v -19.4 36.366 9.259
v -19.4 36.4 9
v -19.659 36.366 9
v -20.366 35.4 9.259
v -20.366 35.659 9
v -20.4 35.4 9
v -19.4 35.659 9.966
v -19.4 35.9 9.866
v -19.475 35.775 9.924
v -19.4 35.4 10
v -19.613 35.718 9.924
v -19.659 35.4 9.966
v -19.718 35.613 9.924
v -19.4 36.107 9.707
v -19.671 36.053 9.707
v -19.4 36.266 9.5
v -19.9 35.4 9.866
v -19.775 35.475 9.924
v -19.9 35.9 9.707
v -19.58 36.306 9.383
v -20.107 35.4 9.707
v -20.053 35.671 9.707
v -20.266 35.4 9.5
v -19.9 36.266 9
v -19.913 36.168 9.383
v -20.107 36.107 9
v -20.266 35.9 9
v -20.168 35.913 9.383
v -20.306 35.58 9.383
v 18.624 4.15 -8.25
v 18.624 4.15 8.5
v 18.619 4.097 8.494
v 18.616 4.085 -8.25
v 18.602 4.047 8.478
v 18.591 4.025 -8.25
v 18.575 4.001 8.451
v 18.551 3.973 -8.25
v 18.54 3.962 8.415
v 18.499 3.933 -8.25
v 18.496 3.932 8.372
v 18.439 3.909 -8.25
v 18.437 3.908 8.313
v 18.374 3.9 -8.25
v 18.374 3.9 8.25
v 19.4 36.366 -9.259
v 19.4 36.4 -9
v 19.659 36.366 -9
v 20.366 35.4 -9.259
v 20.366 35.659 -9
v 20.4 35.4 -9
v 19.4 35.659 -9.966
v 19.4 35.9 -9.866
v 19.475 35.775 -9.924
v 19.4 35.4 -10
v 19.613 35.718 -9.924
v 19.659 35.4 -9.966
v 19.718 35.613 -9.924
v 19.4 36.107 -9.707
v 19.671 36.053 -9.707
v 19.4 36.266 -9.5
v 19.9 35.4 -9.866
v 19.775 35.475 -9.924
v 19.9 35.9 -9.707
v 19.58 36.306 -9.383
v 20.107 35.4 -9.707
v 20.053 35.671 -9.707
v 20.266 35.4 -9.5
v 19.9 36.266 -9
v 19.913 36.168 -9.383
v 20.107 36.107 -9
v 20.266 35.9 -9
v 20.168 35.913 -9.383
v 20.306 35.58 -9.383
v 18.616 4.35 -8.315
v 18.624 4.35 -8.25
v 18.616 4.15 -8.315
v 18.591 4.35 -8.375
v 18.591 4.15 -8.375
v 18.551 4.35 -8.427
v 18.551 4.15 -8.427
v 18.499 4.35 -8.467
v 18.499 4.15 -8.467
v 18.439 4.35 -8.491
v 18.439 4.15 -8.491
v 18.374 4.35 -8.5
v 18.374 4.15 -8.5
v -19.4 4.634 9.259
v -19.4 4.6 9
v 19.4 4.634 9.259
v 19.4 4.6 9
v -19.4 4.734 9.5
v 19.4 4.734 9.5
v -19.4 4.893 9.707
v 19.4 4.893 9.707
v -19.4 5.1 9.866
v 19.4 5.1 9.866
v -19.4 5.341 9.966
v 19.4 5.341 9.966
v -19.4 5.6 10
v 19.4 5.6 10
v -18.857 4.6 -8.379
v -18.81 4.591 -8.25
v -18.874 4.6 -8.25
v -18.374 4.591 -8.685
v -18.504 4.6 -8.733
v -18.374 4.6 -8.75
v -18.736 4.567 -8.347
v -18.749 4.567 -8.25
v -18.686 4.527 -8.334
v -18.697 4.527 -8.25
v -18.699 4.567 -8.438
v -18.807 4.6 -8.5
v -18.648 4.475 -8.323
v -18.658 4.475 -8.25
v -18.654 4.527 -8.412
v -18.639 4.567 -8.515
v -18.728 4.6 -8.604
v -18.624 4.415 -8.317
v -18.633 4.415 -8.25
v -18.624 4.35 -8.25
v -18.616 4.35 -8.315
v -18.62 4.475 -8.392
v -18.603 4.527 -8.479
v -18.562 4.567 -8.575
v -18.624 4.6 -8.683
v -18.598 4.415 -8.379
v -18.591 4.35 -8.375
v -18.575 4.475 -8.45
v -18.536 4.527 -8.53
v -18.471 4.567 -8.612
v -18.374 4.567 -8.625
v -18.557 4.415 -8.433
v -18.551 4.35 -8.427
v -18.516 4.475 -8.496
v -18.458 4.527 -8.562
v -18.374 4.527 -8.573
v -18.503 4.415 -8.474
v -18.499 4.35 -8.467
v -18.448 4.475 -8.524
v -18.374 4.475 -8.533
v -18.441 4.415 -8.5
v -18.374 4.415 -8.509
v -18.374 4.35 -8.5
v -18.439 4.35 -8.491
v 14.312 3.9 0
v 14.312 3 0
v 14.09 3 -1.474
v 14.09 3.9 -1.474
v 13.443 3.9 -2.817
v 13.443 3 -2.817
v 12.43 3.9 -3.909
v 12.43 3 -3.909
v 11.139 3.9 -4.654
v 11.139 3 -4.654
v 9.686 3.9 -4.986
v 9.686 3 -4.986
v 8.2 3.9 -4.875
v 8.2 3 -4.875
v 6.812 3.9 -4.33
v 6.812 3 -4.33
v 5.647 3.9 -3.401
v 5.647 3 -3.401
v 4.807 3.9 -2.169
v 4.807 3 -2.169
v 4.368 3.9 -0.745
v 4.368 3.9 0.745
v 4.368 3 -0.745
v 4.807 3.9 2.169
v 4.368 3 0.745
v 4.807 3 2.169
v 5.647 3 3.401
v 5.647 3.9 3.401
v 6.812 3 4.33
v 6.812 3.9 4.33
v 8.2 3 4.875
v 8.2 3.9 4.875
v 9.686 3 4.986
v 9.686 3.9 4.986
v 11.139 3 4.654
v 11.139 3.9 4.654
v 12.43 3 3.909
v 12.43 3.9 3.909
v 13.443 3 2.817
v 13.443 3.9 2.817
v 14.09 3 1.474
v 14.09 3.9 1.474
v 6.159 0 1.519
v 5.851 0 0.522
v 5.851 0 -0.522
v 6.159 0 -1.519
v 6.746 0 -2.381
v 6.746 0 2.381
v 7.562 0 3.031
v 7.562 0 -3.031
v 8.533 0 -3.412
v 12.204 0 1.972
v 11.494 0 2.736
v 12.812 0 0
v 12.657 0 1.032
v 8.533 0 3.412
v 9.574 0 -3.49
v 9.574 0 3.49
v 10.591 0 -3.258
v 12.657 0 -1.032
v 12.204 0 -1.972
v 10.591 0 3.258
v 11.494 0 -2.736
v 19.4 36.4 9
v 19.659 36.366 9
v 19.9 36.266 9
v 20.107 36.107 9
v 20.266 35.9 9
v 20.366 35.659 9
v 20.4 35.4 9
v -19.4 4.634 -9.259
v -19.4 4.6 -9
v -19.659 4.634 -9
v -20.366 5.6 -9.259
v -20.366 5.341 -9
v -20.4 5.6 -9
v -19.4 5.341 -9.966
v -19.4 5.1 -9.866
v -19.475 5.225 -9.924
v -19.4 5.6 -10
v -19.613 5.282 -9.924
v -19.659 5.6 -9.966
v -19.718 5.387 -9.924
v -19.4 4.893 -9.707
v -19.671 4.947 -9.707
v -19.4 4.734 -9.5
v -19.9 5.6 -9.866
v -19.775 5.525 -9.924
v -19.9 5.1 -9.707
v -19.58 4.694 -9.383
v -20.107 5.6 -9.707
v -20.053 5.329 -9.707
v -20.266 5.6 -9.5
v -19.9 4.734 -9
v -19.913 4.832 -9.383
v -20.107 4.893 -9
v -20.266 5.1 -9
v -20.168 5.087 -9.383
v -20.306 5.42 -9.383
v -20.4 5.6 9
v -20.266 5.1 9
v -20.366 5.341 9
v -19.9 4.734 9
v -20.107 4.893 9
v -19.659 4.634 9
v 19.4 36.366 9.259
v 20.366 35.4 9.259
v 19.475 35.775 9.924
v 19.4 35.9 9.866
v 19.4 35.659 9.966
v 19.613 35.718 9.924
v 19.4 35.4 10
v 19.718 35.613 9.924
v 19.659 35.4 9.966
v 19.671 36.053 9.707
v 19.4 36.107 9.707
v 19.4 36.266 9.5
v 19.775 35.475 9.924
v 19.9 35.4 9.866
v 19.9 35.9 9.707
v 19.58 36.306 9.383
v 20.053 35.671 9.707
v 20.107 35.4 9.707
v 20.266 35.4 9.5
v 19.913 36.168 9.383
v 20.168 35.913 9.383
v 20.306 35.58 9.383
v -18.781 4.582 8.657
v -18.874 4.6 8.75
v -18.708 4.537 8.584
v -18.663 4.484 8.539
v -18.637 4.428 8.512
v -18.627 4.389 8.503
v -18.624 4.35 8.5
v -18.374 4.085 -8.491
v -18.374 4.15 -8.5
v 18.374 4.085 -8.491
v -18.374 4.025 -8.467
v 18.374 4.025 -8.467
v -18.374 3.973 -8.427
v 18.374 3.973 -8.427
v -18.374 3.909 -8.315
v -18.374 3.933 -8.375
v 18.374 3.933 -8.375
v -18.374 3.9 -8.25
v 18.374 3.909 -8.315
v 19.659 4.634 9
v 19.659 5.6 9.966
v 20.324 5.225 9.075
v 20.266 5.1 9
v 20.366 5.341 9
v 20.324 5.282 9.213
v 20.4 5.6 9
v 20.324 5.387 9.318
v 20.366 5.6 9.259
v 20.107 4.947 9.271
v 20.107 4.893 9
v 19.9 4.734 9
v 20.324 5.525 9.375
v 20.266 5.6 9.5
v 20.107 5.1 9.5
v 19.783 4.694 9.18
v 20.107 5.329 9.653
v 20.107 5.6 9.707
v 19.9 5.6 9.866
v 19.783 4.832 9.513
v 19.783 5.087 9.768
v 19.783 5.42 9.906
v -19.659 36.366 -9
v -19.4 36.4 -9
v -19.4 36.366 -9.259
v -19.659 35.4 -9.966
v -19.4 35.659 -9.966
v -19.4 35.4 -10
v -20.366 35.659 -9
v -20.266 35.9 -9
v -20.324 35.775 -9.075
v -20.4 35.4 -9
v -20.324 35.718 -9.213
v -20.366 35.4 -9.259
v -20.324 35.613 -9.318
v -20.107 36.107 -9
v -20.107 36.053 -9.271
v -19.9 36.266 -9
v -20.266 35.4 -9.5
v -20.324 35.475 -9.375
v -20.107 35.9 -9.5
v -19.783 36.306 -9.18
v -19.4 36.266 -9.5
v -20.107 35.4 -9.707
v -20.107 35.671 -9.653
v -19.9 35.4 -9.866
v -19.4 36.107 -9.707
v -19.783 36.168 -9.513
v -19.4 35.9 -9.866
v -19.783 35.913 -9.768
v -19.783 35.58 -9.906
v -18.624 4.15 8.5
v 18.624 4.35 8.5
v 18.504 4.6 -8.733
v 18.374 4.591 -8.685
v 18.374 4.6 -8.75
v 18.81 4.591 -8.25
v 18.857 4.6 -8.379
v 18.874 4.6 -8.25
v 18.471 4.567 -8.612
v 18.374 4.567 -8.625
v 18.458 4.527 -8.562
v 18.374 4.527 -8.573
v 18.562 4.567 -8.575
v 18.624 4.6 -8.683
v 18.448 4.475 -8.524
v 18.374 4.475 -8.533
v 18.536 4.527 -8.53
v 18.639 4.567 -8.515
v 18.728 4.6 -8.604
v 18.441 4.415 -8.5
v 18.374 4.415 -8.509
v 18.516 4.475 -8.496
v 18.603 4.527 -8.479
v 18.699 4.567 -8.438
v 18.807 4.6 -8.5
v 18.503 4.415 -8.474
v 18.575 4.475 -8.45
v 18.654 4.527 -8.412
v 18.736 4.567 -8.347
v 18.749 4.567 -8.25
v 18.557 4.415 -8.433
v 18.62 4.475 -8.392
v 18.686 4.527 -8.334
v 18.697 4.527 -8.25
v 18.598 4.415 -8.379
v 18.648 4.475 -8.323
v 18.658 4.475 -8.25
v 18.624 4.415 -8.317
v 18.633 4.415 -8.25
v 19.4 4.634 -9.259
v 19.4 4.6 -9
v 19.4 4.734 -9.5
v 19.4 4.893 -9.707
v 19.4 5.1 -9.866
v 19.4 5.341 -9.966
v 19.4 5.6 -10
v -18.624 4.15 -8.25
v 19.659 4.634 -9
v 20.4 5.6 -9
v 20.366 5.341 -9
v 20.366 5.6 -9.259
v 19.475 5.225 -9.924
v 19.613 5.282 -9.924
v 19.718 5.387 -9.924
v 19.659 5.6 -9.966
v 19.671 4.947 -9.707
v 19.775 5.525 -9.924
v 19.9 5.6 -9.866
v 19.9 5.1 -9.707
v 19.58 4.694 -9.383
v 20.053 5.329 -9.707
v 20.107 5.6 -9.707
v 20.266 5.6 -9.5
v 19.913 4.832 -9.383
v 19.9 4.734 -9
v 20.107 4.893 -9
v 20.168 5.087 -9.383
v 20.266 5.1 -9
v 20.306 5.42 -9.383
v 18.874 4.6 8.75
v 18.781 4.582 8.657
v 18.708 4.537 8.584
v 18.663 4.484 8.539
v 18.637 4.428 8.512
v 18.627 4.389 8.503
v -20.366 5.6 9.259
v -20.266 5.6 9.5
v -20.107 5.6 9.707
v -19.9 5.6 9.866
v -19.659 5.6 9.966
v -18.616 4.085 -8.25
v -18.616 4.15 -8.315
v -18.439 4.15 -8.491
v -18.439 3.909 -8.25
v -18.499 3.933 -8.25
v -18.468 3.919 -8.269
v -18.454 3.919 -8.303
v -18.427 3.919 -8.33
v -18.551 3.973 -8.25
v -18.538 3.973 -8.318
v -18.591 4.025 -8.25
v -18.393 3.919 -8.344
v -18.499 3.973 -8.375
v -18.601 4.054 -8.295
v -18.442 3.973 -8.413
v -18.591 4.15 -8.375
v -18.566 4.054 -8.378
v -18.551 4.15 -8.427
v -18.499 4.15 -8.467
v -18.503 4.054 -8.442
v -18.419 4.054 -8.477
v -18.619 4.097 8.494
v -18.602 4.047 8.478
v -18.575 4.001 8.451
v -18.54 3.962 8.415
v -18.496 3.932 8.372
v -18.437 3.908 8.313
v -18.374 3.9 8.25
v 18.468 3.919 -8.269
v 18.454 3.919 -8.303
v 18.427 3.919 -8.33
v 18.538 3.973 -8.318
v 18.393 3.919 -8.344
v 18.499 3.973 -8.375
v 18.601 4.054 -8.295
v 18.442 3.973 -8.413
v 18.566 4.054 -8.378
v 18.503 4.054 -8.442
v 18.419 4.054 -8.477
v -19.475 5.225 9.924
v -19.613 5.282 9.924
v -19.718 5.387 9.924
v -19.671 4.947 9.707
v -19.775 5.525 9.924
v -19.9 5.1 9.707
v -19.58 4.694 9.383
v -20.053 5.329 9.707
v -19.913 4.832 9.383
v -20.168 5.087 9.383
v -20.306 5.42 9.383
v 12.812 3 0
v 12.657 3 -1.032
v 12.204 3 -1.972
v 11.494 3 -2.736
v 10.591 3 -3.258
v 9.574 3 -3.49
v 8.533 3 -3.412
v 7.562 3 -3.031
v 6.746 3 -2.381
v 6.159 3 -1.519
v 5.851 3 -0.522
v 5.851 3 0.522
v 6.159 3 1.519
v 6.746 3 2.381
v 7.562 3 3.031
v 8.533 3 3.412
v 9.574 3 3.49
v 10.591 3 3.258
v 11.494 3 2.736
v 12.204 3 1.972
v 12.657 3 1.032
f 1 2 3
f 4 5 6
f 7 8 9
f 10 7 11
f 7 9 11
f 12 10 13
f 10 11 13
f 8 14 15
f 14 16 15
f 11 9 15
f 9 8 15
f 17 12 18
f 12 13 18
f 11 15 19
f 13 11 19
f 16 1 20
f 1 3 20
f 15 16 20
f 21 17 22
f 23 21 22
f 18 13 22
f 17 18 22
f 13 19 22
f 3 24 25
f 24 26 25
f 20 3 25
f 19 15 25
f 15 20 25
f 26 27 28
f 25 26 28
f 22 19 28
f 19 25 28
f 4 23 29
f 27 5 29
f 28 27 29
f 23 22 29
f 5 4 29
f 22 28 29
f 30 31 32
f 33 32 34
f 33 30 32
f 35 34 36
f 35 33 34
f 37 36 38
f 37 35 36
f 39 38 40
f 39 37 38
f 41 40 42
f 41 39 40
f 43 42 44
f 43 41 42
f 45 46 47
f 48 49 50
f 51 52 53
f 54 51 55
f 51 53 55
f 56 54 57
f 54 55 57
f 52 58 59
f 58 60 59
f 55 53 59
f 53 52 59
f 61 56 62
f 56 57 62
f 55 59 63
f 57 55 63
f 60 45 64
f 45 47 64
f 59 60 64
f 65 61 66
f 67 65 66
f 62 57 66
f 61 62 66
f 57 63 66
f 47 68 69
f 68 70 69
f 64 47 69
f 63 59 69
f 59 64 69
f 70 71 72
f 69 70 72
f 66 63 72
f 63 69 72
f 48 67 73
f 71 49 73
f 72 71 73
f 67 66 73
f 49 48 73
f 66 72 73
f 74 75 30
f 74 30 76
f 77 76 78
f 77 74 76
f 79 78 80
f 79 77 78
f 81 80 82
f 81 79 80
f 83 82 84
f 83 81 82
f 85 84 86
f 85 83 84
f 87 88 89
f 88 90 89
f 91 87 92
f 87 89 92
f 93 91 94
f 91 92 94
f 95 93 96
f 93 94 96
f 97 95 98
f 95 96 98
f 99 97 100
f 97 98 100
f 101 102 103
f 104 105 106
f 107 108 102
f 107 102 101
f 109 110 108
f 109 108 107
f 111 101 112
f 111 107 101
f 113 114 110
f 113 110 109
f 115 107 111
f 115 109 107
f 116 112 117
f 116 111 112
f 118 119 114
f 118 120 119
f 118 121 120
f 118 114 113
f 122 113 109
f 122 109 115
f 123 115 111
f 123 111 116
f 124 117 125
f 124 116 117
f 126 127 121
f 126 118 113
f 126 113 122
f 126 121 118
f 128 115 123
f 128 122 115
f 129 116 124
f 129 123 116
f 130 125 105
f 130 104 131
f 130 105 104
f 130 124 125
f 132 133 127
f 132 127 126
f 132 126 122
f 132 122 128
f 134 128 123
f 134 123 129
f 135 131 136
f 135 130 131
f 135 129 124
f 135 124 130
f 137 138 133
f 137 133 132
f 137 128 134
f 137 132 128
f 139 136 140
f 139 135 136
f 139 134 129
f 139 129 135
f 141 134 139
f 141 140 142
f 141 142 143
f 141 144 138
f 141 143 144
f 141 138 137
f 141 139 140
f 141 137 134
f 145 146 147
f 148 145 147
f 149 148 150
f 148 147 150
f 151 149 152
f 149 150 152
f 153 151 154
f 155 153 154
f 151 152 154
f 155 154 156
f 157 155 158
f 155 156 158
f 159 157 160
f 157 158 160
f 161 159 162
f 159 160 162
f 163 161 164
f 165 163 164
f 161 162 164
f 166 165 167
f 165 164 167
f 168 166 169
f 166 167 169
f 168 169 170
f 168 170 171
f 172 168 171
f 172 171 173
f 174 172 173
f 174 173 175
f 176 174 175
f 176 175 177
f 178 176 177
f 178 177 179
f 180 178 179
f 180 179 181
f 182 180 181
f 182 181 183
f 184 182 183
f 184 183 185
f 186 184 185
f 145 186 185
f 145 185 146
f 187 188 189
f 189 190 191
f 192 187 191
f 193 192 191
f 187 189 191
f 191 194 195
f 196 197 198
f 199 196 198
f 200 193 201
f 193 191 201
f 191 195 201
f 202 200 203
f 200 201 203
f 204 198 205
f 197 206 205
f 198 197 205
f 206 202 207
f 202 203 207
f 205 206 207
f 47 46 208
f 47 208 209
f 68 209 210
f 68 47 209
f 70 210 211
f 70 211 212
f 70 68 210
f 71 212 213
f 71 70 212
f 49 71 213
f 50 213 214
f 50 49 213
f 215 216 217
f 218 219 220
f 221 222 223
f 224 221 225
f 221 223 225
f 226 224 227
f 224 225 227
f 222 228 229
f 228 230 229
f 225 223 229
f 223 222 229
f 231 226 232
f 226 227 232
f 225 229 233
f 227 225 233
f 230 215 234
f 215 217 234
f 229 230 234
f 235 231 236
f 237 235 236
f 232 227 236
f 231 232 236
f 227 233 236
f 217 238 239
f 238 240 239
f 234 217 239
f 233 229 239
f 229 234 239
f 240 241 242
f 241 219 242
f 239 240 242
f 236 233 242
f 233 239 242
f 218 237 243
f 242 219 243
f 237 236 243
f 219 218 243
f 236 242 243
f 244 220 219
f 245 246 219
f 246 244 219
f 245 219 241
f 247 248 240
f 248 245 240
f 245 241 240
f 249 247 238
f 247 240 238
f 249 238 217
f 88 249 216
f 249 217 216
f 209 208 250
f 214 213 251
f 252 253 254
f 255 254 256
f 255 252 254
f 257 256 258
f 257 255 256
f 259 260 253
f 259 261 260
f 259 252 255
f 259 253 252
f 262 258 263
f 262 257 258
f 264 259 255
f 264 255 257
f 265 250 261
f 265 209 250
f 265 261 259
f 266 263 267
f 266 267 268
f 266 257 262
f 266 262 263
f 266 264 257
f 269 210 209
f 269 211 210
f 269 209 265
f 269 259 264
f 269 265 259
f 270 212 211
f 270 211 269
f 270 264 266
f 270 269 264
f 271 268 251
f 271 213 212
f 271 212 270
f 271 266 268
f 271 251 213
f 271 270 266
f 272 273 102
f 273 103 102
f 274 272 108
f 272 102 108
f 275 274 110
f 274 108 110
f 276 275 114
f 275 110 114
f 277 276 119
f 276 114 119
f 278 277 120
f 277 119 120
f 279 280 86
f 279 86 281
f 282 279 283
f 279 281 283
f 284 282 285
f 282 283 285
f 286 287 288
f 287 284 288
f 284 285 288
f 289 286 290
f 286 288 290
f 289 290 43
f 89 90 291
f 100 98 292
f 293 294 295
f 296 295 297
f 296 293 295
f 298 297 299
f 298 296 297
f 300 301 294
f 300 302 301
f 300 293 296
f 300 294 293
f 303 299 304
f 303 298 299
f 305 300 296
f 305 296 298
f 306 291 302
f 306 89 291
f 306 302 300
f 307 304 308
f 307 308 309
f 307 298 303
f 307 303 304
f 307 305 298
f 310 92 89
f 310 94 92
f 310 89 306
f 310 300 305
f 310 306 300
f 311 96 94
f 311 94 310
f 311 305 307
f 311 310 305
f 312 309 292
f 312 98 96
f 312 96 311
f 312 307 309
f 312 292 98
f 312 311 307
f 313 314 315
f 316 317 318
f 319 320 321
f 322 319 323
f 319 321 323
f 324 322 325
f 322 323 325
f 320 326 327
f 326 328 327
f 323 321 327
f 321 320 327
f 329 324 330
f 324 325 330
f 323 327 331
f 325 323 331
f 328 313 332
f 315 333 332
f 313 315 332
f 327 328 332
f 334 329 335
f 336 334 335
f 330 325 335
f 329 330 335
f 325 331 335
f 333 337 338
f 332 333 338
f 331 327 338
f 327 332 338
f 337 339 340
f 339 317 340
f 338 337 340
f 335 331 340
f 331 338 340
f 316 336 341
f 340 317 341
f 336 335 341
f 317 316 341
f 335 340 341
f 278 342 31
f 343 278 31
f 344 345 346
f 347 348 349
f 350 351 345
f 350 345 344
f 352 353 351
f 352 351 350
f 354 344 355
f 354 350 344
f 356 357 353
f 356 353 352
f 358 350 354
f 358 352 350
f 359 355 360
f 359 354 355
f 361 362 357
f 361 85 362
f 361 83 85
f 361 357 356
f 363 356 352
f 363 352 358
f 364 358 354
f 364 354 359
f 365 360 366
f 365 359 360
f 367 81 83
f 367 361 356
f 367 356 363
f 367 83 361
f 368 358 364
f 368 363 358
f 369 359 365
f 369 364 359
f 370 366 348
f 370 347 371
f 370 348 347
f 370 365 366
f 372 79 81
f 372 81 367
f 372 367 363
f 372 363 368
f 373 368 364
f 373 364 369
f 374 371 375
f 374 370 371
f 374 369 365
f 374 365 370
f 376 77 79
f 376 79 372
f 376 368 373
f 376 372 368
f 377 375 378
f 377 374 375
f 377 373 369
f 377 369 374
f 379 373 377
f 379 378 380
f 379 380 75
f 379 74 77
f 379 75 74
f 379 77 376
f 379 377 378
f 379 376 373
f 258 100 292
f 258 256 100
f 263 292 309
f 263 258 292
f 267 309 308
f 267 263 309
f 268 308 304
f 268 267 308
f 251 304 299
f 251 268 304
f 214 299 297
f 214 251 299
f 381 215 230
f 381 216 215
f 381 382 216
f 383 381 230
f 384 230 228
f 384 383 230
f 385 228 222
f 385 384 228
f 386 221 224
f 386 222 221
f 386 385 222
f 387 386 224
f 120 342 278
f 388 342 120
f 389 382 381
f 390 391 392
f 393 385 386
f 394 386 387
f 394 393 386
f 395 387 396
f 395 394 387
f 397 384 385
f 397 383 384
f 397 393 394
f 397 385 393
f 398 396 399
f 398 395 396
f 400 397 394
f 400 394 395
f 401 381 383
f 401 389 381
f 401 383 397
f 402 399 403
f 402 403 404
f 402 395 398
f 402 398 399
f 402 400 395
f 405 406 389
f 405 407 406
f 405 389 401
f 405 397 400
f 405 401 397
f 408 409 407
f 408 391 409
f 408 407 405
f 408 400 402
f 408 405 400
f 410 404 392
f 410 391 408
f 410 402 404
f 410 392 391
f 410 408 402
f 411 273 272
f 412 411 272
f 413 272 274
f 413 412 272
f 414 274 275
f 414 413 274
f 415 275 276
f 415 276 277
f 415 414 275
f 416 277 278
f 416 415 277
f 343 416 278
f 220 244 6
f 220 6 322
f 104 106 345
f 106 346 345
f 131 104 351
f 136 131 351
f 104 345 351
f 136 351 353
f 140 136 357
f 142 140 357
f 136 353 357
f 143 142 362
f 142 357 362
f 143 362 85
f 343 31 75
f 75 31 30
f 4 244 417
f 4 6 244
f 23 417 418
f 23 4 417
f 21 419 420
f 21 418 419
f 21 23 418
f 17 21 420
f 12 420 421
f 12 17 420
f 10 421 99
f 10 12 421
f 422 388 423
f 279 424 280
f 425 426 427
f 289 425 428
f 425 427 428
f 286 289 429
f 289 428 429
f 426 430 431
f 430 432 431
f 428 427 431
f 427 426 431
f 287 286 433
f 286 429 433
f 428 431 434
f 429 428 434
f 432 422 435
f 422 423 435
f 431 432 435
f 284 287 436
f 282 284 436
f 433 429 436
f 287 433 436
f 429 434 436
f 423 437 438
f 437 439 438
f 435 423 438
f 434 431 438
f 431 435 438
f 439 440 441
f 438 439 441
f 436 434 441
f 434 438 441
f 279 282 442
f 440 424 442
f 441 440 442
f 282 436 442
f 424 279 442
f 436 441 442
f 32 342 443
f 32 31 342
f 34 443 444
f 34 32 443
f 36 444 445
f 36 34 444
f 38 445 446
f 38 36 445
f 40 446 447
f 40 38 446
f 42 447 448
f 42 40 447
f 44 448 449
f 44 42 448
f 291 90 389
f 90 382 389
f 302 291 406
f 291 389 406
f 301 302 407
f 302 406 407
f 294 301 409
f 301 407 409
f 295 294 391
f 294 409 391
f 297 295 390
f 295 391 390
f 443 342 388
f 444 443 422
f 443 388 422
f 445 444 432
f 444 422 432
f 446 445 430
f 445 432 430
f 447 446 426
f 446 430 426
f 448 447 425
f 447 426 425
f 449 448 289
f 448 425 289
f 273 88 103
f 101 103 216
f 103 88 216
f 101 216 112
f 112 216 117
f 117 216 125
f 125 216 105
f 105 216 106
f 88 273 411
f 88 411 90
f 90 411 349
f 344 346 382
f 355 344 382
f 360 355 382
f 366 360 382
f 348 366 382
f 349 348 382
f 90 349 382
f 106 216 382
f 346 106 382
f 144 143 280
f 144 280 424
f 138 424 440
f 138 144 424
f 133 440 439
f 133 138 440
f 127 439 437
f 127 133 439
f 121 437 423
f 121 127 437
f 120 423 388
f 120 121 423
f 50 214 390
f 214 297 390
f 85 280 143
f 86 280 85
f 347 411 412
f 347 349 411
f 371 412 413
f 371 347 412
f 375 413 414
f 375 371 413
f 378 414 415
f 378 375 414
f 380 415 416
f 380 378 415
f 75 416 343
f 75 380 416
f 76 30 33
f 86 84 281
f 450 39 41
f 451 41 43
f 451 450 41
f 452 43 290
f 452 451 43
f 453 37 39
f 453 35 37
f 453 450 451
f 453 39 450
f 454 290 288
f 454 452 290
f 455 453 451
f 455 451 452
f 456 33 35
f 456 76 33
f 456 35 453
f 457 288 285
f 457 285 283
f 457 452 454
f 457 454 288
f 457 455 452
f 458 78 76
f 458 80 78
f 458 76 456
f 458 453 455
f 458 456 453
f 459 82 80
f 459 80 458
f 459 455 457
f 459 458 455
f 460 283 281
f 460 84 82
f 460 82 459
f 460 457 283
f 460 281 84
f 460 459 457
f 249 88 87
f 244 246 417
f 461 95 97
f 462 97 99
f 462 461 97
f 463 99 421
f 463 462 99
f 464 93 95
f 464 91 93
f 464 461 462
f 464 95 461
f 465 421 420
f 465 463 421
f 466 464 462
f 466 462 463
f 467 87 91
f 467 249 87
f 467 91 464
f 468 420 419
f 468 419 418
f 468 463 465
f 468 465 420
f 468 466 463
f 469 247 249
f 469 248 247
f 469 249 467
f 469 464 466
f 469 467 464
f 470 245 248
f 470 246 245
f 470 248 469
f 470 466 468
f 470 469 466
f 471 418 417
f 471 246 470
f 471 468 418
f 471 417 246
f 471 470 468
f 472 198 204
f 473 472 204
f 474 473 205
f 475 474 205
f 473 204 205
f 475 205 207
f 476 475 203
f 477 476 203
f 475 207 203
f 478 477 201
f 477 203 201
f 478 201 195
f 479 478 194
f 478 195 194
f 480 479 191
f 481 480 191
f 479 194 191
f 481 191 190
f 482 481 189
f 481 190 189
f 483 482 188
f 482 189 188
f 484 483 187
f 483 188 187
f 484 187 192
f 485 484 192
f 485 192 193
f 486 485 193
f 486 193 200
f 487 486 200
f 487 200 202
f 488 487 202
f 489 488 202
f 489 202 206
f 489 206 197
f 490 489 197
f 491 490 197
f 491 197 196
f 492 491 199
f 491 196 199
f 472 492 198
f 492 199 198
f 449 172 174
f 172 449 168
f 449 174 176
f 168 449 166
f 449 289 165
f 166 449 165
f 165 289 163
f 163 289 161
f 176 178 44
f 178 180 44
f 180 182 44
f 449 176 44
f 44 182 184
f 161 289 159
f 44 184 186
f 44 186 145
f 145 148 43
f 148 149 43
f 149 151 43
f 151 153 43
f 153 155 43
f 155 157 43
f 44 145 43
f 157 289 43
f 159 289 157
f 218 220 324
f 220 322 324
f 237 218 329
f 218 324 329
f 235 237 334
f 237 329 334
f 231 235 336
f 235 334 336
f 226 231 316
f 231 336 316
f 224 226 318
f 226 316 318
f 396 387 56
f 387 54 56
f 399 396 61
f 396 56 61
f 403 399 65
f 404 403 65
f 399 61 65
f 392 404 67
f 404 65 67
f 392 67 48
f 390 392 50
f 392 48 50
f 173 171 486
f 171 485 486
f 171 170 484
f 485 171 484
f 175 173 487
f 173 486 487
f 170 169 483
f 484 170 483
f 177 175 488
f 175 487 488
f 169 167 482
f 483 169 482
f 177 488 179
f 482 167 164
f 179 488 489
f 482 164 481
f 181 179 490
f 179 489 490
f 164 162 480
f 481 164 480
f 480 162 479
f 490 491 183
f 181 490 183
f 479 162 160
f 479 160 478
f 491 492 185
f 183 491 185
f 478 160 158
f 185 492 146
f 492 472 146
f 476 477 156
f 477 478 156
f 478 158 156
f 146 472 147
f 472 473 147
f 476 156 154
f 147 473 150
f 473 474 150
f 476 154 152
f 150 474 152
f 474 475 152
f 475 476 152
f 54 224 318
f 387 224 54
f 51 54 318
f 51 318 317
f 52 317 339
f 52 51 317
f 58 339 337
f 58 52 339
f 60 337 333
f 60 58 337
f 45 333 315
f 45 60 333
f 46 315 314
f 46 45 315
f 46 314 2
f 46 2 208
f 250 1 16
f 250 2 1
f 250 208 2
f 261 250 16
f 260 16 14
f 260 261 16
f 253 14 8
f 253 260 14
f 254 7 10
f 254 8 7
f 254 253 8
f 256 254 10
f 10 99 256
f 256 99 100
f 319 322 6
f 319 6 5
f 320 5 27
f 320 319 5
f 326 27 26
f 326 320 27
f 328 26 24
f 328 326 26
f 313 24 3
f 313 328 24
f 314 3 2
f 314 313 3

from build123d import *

# Parameters (mm, degrees)
SKETCH1_W           = 40.8
SKETCH1_H           = 20
BOSS_EXTRUDE1_DEPTH = 36.4
SKETCH2_W           = 40.8
SKETCH2_H           = 20
SKETCH2_W_2         = 37.24847256
SKETCH2_H_2         = 17
CUT_EXTRUDE1_DEPTH  = 4.6
SKETCH3_W           = 37.24847256
SKETCH3_H           = 17
SKETCH3_R           = 5
CUT_EXTRUDE2_DEPTH  = 3.9
SKETCH4_R           = 5
SKETCH4_R_2         = 3.5
CUT_EXTRUDE3_DEPTH  = 3
FILLET1_R           = 1
FILLET2_R           = 0.25


with BuildPart() as part:
    # Sketch1 → Boss-Extrude1 (new body)
    with BuildSketch(Plane(origin=(0, 0, 0), x_dir=(1, 0, 0), z_dir=(0, 1, 0))):
        Rectangle(SKETCH1_W, SKETCH1_H)
    extrude(amount=BOSS_EXTRUDE1_DEPTH)

    # Sketch2 → Cut-Extrude1 (cut)
    with BuildSketch(Plane(origin=(0, 0, 0), x_dir=(1, 0, 0), z_dir=(0, 1, 0))):
        Rectangle(SKETCH2_W, SKETCH2_H)
        Rectangle(SKETCH2_W_2, SKETCH2_H_2, mode=Mode.SUBTRACT)
    extrude(amount=CUT_EXTRUDE1_DEPTH, mode=Mode.SUBTRACT)

    # Sketch3 → Cut-Extrude2 (cut)
    with BuildSketch(Plane(origin=(0, 0, 0), x_dir=(1, 0, 0), z_dir=(0, 1, 0))):
        Rectangle(SKETCH3_W, SKETCH3_H)
        with Locations((9.31211814, 0)):
            Circle(SKETCH3_R, mode=Mode.SUBTRACT)
    extrude(amount=CUT_EXTRUDE2_DEPTH, mode=Mode.SUBTRACT)

    # Sketch4 → Cut-Extrude3 (cut)
    with BuildSketch(Plane(origin=(0, 0, 0), x_dir=(1, 0, 0), z_dir=(0, 1, 0))):
        with Locations((9.31211814, 0)):
            Circle(SKETCH4_R)
        with Locations((9.31211814, 0)):
            Circle(SKETCH4_R_2, mode=Mode.SUBTRACT)
    extrude(amount=CUT_EXTRUDE3_DEPTH, mode=Mode.SUBTRACT)

    # Fillet1
    fillet1_edges = [part.edges().sort_by_distance(p)[0] for p in [
        (20.4, 36.4, 0),
        (0, 36.4, -10),
        (-20.4, 4.6, 0),
        (0, 4.6, 10),
        (20.4, 4.6, 0),
        (0, 4.6, -10),
        (-20.4, 36.4, 0),
        (0, 36.4, 10),
        (-20.4, 20.5, -10),
        (20.4, 20.5, -10),
        (20.4, 20.5, 10),
        (-20.4, 20.5, 10),
    ]]
    fillet(fillet1_edges, radius=FILLET1_R)

    # Fillet2
    fillet2_edges = [part.edges().sort_by_distance(p)[0] for p in [
        (-18.62423628, 4.6, 0),
        (0, 4.6, 8.5),
        (18.62423628, 4.6, 0),
        (18.62423628, 4.25, -8.5),
        (0, 4.6, -8.5),
        (-18.62423628, 4.25, -8.5),
        (-18.62423628, 3.9, 0),
        (0, 3.9, 8.5),
        (18.62423628, 3.9, 0),
        (0, 3.9, -8.5),
    ]]
    fillet(fillet2_edges, radius=FILLET2_R)


solid = part.part
